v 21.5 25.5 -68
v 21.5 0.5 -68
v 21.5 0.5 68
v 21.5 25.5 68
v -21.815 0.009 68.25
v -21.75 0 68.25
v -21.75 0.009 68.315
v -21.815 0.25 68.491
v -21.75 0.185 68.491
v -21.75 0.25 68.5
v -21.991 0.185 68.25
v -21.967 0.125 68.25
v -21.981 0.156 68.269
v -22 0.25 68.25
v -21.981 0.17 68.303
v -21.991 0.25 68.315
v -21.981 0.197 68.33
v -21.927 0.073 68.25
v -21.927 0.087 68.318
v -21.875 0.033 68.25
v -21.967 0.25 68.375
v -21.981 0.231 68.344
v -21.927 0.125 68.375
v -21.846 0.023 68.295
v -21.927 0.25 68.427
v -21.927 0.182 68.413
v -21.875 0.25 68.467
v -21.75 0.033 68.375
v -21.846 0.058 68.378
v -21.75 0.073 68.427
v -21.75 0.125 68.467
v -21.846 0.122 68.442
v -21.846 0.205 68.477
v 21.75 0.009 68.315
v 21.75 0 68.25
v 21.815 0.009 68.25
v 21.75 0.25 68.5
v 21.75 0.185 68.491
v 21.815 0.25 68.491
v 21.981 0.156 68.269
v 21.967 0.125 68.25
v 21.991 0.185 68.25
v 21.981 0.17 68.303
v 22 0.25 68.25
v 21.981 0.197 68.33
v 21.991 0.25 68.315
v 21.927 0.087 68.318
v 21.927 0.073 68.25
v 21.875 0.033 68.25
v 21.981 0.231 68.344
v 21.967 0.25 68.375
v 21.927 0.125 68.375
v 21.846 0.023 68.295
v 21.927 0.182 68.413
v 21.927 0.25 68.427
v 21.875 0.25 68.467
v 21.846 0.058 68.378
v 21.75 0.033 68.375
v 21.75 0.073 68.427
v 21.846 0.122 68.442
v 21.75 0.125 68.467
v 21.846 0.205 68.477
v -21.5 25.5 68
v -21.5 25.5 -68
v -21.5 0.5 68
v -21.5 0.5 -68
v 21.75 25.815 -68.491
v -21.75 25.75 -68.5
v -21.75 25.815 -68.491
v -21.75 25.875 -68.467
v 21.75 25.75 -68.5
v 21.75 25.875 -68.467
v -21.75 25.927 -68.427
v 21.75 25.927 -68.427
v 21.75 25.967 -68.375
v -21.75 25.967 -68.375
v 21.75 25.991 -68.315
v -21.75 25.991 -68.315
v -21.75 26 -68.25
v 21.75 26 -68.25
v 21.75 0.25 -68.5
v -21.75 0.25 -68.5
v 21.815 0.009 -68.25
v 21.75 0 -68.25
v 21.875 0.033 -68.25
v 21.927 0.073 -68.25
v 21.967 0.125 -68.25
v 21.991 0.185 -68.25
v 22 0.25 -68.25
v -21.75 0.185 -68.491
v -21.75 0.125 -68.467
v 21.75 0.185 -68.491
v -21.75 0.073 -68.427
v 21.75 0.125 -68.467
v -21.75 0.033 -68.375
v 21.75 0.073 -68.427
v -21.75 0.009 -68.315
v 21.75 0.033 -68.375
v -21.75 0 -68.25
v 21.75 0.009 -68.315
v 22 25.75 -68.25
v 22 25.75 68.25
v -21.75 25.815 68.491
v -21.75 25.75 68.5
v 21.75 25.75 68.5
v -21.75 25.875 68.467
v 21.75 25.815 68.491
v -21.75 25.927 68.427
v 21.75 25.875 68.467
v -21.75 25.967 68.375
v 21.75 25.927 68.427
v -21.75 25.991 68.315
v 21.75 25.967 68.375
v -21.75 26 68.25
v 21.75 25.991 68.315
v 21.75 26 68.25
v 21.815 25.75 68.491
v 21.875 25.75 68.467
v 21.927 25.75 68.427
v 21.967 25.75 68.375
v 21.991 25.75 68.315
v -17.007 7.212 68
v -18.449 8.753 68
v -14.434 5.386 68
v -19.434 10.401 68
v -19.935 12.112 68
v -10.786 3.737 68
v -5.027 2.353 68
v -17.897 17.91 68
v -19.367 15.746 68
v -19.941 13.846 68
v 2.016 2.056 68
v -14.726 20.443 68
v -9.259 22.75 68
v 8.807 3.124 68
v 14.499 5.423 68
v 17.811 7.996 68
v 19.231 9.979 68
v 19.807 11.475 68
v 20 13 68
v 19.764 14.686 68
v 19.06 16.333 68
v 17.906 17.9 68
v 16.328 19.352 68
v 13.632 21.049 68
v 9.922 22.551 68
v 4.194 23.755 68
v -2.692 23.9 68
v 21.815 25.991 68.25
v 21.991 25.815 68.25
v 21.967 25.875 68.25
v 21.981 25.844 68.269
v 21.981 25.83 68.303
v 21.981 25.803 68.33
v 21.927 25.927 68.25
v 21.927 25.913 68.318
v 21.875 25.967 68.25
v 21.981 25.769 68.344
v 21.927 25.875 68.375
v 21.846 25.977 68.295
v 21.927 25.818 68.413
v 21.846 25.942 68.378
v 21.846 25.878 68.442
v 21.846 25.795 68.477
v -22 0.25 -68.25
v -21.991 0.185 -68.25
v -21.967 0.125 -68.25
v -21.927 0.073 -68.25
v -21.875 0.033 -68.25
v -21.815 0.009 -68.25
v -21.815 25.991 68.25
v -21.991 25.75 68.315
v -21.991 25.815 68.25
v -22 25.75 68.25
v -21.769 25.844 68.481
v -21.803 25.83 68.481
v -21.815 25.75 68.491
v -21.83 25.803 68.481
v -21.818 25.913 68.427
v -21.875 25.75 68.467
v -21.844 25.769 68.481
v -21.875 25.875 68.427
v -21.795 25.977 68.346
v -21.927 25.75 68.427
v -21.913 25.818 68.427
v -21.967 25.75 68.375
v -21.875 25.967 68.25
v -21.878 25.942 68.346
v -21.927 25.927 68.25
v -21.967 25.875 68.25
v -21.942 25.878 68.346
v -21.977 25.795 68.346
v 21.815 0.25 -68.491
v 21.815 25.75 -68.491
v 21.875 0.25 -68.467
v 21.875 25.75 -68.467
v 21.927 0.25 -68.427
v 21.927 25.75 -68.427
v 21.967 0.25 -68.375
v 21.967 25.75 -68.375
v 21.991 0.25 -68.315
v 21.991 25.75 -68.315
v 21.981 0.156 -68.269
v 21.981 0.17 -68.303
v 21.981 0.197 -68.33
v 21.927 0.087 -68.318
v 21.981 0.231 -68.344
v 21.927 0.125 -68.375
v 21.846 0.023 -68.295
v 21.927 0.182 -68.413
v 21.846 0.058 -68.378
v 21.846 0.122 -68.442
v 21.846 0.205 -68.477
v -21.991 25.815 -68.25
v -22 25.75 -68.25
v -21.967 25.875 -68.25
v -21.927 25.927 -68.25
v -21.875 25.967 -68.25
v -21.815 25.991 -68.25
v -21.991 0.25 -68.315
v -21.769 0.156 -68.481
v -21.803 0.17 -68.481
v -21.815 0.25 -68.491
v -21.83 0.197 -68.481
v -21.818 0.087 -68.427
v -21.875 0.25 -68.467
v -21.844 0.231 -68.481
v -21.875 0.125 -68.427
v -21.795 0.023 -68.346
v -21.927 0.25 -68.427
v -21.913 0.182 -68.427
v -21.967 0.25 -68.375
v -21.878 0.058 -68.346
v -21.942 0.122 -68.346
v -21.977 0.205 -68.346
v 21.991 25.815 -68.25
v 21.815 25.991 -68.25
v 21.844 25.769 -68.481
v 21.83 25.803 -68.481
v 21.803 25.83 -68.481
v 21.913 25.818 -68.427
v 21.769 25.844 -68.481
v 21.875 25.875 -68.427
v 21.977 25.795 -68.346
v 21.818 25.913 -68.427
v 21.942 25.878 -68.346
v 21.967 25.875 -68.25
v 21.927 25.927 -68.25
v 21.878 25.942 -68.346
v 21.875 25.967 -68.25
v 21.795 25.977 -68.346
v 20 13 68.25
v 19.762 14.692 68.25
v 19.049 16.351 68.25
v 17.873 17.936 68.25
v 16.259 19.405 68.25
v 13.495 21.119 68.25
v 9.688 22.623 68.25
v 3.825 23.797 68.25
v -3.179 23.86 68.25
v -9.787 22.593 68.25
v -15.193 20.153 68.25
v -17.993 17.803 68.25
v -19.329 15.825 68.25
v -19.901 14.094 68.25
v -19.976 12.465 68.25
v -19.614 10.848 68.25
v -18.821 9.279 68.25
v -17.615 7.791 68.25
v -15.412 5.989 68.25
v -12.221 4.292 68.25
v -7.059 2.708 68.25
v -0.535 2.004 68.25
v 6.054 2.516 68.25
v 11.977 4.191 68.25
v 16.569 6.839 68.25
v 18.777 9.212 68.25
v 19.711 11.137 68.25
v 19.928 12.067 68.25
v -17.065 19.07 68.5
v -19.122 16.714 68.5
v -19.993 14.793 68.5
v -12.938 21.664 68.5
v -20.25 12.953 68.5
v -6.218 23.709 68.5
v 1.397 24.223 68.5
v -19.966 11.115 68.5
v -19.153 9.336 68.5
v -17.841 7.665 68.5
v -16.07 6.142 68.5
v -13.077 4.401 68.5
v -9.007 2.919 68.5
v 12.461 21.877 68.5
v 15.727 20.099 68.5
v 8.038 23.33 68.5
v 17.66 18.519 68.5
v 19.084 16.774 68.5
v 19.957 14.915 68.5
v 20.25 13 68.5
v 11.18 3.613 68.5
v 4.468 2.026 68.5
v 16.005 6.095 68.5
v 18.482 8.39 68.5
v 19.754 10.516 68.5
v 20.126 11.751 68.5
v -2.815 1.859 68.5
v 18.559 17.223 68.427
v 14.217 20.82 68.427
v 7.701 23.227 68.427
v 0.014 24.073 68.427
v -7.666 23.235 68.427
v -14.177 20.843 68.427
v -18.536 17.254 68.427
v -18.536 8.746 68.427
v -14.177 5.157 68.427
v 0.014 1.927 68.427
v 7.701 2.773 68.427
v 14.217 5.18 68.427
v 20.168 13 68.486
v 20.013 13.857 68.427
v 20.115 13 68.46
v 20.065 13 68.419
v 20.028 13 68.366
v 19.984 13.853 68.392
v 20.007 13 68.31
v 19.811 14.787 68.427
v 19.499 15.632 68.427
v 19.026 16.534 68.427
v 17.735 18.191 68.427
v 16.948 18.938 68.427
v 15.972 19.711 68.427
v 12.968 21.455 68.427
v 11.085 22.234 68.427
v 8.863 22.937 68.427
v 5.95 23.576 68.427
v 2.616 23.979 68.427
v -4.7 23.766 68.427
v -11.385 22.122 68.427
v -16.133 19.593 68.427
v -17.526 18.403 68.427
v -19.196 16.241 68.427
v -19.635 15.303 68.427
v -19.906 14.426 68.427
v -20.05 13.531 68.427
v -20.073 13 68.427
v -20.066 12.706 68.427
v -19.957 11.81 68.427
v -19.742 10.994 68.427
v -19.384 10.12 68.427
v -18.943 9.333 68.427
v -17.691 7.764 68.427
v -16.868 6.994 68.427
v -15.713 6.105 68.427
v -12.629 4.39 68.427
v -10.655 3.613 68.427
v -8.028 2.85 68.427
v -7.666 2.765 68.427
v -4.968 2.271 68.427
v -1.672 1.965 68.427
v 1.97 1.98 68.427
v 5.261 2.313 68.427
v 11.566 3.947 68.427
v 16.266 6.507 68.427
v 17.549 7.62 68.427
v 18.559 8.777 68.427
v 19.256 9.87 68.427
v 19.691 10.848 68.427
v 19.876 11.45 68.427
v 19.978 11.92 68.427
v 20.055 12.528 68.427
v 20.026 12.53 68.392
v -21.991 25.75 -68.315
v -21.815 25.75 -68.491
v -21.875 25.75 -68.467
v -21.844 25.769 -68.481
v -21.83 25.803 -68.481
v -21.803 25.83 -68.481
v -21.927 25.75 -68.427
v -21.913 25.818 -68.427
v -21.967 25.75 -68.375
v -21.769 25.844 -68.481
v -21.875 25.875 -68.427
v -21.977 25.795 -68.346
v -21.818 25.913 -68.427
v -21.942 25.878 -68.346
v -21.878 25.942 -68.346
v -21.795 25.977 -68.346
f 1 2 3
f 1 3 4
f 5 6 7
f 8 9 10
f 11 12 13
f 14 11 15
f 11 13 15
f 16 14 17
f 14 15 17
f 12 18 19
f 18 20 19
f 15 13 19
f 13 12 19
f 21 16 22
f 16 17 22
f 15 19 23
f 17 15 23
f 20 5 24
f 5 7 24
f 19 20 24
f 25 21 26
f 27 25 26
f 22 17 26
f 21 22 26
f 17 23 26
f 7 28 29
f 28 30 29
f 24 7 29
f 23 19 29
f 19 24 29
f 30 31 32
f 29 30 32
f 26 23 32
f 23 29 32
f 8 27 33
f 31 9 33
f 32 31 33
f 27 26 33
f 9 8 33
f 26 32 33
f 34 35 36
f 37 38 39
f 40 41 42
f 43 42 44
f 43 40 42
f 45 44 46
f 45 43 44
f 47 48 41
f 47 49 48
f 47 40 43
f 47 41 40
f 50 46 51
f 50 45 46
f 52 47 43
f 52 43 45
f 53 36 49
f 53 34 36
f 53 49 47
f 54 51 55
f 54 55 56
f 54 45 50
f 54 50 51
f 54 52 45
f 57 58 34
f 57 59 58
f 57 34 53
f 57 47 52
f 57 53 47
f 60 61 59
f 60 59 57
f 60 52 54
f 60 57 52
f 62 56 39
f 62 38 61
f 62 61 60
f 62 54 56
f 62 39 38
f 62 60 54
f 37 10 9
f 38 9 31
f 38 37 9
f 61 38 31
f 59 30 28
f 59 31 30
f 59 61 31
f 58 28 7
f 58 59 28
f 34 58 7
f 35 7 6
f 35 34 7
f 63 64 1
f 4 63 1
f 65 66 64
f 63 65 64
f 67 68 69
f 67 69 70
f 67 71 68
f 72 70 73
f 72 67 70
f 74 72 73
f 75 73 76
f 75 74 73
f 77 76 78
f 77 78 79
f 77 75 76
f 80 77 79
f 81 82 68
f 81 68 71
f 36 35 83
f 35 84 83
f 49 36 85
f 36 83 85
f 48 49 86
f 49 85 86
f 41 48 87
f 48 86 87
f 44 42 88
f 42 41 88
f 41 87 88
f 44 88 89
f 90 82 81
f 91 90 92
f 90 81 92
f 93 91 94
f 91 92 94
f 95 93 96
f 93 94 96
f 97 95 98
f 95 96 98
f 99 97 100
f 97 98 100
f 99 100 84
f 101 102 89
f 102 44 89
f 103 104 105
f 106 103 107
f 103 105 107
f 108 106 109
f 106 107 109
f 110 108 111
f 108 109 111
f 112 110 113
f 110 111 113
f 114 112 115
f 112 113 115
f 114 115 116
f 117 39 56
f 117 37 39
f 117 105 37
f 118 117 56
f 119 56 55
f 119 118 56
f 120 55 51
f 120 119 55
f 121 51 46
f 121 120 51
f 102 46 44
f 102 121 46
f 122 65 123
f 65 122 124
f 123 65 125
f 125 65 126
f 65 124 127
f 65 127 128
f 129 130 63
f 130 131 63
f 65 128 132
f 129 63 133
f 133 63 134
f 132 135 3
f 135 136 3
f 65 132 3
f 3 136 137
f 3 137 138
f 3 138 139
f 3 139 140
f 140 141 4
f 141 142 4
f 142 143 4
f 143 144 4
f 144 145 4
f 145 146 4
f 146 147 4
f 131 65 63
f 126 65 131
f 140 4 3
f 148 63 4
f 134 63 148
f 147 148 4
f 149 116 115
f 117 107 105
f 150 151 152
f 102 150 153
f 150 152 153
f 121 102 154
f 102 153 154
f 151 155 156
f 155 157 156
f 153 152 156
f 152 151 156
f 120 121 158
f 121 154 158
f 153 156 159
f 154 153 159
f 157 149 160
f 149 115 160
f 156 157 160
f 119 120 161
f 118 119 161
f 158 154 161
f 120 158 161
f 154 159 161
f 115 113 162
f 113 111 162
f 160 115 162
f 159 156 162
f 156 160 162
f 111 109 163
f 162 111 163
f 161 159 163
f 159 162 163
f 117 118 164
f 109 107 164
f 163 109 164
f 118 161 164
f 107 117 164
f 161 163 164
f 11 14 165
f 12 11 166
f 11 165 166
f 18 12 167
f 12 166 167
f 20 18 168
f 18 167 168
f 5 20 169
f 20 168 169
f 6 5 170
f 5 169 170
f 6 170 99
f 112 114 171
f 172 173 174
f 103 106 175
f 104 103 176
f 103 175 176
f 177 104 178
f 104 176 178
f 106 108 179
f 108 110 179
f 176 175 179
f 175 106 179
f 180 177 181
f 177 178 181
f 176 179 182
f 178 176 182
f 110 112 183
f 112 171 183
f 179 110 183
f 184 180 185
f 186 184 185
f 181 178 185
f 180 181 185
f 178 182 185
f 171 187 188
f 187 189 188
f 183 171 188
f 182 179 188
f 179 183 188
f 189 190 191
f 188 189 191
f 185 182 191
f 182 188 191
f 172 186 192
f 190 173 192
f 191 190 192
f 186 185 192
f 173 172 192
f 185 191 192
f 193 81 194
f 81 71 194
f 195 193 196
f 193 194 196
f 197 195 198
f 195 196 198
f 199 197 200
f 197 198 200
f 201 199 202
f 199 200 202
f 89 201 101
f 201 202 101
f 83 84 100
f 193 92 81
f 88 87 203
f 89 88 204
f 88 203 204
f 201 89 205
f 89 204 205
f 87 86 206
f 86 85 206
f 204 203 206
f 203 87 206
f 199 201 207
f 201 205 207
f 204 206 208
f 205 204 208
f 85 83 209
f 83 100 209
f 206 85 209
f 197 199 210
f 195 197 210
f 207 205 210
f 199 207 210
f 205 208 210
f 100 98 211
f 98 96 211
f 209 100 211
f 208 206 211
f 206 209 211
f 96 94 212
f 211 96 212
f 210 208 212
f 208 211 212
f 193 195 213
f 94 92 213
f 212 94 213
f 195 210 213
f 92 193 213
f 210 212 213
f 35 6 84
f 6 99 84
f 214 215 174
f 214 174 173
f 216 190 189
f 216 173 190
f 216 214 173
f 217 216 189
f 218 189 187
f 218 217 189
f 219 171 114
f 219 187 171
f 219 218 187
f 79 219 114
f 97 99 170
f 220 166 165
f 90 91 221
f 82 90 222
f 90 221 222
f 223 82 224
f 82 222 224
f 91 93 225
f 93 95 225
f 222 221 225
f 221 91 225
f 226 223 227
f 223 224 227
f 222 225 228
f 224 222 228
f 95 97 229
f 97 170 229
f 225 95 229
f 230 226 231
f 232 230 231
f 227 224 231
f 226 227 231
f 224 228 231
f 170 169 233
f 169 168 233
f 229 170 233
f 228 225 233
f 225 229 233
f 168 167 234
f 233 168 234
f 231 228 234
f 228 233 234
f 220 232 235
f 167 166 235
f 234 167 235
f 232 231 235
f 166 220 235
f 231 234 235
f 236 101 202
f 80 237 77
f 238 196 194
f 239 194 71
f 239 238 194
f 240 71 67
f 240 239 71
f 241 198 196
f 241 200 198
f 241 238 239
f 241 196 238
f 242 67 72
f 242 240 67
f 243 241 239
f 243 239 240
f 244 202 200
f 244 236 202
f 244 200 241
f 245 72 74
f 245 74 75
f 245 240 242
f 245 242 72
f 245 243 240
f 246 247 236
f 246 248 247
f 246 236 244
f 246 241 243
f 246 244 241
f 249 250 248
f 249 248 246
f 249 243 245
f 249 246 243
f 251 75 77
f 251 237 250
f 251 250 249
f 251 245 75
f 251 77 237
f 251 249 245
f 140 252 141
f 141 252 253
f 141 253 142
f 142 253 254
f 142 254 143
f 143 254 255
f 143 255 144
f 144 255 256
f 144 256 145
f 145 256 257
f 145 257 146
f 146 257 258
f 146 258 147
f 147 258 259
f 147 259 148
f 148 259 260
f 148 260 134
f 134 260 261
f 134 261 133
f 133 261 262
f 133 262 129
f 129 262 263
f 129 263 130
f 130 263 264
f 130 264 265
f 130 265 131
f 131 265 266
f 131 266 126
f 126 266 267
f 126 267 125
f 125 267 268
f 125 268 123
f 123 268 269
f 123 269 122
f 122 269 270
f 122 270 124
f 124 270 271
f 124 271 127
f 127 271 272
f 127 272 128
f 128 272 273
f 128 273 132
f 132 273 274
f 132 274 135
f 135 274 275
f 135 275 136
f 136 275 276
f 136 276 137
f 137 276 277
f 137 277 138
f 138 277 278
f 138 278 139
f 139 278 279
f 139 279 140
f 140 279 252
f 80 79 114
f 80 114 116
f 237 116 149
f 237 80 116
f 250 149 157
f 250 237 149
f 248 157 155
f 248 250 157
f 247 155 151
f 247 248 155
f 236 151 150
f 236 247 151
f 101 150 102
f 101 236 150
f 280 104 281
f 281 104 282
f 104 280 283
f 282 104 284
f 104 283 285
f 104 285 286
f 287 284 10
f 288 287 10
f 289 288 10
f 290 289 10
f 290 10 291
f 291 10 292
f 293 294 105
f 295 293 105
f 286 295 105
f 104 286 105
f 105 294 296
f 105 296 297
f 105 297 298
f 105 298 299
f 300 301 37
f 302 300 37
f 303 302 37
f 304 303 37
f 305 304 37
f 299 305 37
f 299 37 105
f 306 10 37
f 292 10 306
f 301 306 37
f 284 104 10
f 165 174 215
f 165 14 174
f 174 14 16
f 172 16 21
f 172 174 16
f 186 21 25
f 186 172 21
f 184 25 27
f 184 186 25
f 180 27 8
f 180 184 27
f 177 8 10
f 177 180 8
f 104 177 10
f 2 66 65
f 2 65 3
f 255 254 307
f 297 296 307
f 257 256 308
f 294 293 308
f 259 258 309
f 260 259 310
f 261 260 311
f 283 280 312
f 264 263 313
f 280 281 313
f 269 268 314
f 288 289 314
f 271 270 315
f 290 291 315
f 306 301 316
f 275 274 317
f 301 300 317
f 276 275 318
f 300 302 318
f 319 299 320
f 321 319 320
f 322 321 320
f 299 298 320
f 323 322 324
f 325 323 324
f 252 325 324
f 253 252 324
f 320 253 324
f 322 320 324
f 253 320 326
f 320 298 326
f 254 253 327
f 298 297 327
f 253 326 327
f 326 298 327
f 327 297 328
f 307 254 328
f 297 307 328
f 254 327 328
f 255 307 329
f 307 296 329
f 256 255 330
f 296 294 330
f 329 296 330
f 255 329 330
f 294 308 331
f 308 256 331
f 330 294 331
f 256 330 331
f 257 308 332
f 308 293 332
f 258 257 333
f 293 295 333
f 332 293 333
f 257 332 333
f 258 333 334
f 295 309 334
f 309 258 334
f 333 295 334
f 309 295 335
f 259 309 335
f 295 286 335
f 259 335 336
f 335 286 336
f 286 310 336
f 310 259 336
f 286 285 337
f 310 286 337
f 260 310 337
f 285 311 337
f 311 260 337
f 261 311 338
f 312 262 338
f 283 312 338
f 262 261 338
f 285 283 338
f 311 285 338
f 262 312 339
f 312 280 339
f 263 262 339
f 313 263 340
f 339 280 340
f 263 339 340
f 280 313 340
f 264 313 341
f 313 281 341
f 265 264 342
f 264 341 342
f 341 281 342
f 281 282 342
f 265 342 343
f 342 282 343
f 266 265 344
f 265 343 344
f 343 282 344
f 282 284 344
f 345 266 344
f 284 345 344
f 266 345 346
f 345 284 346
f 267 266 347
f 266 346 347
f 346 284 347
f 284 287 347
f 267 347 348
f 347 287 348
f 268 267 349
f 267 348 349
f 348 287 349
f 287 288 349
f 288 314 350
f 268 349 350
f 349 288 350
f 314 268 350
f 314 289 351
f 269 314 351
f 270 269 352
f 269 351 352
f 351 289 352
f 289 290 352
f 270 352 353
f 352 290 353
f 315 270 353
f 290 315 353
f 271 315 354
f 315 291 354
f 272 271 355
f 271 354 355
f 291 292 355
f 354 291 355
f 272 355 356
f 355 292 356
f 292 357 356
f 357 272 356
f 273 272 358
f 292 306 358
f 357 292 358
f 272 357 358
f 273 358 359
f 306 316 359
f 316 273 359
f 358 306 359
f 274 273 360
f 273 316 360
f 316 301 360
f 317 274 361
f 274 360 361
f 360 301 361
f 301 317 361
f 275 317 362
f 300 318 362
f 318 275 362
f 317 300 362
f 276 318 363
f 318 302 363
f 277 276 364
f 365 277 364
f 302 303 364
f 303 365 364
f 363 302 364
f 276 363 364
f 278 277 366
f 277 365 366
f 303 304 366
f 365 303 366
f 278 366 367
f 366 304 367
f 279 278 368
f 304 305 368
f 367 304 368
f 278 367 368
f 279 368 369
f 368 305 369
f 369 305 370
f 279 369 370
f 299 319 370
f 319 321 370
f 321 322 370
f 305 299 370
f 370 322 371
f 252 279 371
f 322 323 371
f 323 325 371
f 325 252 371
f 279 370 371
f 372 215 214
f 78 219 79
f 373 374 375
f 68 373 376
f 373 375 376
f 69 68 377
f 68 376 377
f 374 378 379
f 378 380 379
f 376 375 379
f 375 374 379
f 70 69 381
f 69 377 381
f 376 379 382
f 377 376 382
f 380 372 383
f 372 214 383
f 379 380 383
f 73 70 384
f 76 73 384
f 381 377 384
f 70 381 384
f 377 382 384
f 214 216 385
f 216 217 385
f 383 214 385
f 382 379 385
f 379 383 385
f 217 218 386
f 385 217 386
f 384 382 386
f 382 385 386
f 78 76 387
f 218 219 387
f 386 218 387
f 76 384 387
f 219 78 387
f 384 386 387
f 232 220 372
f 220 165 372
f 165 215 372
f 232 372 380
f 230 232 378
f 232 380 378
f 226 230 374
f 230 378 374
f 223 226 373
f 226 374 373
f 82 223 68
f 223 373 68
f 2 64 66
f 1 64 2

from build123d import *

# Parameters (mm, degrees)
SKETCH1_W           = 44
SKETCH1_H           = 137
BOSS_EXTRUDE1_DEPTH = 26
SKETCH2_RX          = 20
SKETCH2_RY          = 11
CUT_EXTRUDE1_DEPTH  = 0.5
SHELL1_START        = -68
SHELL1_OUTLINE_W    = 43
SHELL1_OUTLINE_H    = 25
SHELL1_DEPTH        = 136
FILLET1_R           = 0.25


# Read off the part's stored shape, not the designer's step: Shell1
with BuildPart() as part:
    # Sketch1 → Boss-Extrude1 (new body)
    with BuildSketch(Plane(origin=(0, 0, 0), x_dir=(1, 0, 0), z_dir=(0, 1, 0))):
        Rectangle(SKETCH1_W, SKETCH1_H)
    extrude(amount=BOSS_EXTRUDE1_DEPTH)

    # Sketch2 → Cut-Extrude1 (cut)
    with BuildSketch(Plane.XY.offset(68.5)):
        with Locations((0, 13)):
            Ellipse(SKETCH2_RX, SKETCH2_RY)
    extrude(amount=-CUT_EXTRUDE1_DEPTH, mode=Mode.SUBTRACT)

    # Shell1 outline → Shell1 (cut)
    with BuildSketch(Plane.XY.offset(SHELL1_START)):
        with Locations((0, 13)):
            Rectangle(SHELL1_OUTLINE_W, SHELL1_OUTLINE_H)
    extrude(amount=SHELL1_DEPTH, mode=Mode.SUBTRACT)

    # Fillet1
    fillet1_edges = [part.edges().sort_by_distance(p)[0] for p in [
        (-22, 26, 0),
        (-19.999850375, 12.957450604, 68.5),
        (0, 26, 68.5),
        (22, 26, 0),
        (0, 0, 68.5),
        (-22, 0, 0),
        (0, 0, -68.5),
        (22, 0, 0),
        (22, 13, 68.5),
        (-22, 13, 68.5),
        (-22, 13, -68.5),
        (22, 13, -68.5),
        (0, 26, -68.5),
    ]]
    fillet(fillet1_edges, radius=FILLET1_R)


solid = part.part
